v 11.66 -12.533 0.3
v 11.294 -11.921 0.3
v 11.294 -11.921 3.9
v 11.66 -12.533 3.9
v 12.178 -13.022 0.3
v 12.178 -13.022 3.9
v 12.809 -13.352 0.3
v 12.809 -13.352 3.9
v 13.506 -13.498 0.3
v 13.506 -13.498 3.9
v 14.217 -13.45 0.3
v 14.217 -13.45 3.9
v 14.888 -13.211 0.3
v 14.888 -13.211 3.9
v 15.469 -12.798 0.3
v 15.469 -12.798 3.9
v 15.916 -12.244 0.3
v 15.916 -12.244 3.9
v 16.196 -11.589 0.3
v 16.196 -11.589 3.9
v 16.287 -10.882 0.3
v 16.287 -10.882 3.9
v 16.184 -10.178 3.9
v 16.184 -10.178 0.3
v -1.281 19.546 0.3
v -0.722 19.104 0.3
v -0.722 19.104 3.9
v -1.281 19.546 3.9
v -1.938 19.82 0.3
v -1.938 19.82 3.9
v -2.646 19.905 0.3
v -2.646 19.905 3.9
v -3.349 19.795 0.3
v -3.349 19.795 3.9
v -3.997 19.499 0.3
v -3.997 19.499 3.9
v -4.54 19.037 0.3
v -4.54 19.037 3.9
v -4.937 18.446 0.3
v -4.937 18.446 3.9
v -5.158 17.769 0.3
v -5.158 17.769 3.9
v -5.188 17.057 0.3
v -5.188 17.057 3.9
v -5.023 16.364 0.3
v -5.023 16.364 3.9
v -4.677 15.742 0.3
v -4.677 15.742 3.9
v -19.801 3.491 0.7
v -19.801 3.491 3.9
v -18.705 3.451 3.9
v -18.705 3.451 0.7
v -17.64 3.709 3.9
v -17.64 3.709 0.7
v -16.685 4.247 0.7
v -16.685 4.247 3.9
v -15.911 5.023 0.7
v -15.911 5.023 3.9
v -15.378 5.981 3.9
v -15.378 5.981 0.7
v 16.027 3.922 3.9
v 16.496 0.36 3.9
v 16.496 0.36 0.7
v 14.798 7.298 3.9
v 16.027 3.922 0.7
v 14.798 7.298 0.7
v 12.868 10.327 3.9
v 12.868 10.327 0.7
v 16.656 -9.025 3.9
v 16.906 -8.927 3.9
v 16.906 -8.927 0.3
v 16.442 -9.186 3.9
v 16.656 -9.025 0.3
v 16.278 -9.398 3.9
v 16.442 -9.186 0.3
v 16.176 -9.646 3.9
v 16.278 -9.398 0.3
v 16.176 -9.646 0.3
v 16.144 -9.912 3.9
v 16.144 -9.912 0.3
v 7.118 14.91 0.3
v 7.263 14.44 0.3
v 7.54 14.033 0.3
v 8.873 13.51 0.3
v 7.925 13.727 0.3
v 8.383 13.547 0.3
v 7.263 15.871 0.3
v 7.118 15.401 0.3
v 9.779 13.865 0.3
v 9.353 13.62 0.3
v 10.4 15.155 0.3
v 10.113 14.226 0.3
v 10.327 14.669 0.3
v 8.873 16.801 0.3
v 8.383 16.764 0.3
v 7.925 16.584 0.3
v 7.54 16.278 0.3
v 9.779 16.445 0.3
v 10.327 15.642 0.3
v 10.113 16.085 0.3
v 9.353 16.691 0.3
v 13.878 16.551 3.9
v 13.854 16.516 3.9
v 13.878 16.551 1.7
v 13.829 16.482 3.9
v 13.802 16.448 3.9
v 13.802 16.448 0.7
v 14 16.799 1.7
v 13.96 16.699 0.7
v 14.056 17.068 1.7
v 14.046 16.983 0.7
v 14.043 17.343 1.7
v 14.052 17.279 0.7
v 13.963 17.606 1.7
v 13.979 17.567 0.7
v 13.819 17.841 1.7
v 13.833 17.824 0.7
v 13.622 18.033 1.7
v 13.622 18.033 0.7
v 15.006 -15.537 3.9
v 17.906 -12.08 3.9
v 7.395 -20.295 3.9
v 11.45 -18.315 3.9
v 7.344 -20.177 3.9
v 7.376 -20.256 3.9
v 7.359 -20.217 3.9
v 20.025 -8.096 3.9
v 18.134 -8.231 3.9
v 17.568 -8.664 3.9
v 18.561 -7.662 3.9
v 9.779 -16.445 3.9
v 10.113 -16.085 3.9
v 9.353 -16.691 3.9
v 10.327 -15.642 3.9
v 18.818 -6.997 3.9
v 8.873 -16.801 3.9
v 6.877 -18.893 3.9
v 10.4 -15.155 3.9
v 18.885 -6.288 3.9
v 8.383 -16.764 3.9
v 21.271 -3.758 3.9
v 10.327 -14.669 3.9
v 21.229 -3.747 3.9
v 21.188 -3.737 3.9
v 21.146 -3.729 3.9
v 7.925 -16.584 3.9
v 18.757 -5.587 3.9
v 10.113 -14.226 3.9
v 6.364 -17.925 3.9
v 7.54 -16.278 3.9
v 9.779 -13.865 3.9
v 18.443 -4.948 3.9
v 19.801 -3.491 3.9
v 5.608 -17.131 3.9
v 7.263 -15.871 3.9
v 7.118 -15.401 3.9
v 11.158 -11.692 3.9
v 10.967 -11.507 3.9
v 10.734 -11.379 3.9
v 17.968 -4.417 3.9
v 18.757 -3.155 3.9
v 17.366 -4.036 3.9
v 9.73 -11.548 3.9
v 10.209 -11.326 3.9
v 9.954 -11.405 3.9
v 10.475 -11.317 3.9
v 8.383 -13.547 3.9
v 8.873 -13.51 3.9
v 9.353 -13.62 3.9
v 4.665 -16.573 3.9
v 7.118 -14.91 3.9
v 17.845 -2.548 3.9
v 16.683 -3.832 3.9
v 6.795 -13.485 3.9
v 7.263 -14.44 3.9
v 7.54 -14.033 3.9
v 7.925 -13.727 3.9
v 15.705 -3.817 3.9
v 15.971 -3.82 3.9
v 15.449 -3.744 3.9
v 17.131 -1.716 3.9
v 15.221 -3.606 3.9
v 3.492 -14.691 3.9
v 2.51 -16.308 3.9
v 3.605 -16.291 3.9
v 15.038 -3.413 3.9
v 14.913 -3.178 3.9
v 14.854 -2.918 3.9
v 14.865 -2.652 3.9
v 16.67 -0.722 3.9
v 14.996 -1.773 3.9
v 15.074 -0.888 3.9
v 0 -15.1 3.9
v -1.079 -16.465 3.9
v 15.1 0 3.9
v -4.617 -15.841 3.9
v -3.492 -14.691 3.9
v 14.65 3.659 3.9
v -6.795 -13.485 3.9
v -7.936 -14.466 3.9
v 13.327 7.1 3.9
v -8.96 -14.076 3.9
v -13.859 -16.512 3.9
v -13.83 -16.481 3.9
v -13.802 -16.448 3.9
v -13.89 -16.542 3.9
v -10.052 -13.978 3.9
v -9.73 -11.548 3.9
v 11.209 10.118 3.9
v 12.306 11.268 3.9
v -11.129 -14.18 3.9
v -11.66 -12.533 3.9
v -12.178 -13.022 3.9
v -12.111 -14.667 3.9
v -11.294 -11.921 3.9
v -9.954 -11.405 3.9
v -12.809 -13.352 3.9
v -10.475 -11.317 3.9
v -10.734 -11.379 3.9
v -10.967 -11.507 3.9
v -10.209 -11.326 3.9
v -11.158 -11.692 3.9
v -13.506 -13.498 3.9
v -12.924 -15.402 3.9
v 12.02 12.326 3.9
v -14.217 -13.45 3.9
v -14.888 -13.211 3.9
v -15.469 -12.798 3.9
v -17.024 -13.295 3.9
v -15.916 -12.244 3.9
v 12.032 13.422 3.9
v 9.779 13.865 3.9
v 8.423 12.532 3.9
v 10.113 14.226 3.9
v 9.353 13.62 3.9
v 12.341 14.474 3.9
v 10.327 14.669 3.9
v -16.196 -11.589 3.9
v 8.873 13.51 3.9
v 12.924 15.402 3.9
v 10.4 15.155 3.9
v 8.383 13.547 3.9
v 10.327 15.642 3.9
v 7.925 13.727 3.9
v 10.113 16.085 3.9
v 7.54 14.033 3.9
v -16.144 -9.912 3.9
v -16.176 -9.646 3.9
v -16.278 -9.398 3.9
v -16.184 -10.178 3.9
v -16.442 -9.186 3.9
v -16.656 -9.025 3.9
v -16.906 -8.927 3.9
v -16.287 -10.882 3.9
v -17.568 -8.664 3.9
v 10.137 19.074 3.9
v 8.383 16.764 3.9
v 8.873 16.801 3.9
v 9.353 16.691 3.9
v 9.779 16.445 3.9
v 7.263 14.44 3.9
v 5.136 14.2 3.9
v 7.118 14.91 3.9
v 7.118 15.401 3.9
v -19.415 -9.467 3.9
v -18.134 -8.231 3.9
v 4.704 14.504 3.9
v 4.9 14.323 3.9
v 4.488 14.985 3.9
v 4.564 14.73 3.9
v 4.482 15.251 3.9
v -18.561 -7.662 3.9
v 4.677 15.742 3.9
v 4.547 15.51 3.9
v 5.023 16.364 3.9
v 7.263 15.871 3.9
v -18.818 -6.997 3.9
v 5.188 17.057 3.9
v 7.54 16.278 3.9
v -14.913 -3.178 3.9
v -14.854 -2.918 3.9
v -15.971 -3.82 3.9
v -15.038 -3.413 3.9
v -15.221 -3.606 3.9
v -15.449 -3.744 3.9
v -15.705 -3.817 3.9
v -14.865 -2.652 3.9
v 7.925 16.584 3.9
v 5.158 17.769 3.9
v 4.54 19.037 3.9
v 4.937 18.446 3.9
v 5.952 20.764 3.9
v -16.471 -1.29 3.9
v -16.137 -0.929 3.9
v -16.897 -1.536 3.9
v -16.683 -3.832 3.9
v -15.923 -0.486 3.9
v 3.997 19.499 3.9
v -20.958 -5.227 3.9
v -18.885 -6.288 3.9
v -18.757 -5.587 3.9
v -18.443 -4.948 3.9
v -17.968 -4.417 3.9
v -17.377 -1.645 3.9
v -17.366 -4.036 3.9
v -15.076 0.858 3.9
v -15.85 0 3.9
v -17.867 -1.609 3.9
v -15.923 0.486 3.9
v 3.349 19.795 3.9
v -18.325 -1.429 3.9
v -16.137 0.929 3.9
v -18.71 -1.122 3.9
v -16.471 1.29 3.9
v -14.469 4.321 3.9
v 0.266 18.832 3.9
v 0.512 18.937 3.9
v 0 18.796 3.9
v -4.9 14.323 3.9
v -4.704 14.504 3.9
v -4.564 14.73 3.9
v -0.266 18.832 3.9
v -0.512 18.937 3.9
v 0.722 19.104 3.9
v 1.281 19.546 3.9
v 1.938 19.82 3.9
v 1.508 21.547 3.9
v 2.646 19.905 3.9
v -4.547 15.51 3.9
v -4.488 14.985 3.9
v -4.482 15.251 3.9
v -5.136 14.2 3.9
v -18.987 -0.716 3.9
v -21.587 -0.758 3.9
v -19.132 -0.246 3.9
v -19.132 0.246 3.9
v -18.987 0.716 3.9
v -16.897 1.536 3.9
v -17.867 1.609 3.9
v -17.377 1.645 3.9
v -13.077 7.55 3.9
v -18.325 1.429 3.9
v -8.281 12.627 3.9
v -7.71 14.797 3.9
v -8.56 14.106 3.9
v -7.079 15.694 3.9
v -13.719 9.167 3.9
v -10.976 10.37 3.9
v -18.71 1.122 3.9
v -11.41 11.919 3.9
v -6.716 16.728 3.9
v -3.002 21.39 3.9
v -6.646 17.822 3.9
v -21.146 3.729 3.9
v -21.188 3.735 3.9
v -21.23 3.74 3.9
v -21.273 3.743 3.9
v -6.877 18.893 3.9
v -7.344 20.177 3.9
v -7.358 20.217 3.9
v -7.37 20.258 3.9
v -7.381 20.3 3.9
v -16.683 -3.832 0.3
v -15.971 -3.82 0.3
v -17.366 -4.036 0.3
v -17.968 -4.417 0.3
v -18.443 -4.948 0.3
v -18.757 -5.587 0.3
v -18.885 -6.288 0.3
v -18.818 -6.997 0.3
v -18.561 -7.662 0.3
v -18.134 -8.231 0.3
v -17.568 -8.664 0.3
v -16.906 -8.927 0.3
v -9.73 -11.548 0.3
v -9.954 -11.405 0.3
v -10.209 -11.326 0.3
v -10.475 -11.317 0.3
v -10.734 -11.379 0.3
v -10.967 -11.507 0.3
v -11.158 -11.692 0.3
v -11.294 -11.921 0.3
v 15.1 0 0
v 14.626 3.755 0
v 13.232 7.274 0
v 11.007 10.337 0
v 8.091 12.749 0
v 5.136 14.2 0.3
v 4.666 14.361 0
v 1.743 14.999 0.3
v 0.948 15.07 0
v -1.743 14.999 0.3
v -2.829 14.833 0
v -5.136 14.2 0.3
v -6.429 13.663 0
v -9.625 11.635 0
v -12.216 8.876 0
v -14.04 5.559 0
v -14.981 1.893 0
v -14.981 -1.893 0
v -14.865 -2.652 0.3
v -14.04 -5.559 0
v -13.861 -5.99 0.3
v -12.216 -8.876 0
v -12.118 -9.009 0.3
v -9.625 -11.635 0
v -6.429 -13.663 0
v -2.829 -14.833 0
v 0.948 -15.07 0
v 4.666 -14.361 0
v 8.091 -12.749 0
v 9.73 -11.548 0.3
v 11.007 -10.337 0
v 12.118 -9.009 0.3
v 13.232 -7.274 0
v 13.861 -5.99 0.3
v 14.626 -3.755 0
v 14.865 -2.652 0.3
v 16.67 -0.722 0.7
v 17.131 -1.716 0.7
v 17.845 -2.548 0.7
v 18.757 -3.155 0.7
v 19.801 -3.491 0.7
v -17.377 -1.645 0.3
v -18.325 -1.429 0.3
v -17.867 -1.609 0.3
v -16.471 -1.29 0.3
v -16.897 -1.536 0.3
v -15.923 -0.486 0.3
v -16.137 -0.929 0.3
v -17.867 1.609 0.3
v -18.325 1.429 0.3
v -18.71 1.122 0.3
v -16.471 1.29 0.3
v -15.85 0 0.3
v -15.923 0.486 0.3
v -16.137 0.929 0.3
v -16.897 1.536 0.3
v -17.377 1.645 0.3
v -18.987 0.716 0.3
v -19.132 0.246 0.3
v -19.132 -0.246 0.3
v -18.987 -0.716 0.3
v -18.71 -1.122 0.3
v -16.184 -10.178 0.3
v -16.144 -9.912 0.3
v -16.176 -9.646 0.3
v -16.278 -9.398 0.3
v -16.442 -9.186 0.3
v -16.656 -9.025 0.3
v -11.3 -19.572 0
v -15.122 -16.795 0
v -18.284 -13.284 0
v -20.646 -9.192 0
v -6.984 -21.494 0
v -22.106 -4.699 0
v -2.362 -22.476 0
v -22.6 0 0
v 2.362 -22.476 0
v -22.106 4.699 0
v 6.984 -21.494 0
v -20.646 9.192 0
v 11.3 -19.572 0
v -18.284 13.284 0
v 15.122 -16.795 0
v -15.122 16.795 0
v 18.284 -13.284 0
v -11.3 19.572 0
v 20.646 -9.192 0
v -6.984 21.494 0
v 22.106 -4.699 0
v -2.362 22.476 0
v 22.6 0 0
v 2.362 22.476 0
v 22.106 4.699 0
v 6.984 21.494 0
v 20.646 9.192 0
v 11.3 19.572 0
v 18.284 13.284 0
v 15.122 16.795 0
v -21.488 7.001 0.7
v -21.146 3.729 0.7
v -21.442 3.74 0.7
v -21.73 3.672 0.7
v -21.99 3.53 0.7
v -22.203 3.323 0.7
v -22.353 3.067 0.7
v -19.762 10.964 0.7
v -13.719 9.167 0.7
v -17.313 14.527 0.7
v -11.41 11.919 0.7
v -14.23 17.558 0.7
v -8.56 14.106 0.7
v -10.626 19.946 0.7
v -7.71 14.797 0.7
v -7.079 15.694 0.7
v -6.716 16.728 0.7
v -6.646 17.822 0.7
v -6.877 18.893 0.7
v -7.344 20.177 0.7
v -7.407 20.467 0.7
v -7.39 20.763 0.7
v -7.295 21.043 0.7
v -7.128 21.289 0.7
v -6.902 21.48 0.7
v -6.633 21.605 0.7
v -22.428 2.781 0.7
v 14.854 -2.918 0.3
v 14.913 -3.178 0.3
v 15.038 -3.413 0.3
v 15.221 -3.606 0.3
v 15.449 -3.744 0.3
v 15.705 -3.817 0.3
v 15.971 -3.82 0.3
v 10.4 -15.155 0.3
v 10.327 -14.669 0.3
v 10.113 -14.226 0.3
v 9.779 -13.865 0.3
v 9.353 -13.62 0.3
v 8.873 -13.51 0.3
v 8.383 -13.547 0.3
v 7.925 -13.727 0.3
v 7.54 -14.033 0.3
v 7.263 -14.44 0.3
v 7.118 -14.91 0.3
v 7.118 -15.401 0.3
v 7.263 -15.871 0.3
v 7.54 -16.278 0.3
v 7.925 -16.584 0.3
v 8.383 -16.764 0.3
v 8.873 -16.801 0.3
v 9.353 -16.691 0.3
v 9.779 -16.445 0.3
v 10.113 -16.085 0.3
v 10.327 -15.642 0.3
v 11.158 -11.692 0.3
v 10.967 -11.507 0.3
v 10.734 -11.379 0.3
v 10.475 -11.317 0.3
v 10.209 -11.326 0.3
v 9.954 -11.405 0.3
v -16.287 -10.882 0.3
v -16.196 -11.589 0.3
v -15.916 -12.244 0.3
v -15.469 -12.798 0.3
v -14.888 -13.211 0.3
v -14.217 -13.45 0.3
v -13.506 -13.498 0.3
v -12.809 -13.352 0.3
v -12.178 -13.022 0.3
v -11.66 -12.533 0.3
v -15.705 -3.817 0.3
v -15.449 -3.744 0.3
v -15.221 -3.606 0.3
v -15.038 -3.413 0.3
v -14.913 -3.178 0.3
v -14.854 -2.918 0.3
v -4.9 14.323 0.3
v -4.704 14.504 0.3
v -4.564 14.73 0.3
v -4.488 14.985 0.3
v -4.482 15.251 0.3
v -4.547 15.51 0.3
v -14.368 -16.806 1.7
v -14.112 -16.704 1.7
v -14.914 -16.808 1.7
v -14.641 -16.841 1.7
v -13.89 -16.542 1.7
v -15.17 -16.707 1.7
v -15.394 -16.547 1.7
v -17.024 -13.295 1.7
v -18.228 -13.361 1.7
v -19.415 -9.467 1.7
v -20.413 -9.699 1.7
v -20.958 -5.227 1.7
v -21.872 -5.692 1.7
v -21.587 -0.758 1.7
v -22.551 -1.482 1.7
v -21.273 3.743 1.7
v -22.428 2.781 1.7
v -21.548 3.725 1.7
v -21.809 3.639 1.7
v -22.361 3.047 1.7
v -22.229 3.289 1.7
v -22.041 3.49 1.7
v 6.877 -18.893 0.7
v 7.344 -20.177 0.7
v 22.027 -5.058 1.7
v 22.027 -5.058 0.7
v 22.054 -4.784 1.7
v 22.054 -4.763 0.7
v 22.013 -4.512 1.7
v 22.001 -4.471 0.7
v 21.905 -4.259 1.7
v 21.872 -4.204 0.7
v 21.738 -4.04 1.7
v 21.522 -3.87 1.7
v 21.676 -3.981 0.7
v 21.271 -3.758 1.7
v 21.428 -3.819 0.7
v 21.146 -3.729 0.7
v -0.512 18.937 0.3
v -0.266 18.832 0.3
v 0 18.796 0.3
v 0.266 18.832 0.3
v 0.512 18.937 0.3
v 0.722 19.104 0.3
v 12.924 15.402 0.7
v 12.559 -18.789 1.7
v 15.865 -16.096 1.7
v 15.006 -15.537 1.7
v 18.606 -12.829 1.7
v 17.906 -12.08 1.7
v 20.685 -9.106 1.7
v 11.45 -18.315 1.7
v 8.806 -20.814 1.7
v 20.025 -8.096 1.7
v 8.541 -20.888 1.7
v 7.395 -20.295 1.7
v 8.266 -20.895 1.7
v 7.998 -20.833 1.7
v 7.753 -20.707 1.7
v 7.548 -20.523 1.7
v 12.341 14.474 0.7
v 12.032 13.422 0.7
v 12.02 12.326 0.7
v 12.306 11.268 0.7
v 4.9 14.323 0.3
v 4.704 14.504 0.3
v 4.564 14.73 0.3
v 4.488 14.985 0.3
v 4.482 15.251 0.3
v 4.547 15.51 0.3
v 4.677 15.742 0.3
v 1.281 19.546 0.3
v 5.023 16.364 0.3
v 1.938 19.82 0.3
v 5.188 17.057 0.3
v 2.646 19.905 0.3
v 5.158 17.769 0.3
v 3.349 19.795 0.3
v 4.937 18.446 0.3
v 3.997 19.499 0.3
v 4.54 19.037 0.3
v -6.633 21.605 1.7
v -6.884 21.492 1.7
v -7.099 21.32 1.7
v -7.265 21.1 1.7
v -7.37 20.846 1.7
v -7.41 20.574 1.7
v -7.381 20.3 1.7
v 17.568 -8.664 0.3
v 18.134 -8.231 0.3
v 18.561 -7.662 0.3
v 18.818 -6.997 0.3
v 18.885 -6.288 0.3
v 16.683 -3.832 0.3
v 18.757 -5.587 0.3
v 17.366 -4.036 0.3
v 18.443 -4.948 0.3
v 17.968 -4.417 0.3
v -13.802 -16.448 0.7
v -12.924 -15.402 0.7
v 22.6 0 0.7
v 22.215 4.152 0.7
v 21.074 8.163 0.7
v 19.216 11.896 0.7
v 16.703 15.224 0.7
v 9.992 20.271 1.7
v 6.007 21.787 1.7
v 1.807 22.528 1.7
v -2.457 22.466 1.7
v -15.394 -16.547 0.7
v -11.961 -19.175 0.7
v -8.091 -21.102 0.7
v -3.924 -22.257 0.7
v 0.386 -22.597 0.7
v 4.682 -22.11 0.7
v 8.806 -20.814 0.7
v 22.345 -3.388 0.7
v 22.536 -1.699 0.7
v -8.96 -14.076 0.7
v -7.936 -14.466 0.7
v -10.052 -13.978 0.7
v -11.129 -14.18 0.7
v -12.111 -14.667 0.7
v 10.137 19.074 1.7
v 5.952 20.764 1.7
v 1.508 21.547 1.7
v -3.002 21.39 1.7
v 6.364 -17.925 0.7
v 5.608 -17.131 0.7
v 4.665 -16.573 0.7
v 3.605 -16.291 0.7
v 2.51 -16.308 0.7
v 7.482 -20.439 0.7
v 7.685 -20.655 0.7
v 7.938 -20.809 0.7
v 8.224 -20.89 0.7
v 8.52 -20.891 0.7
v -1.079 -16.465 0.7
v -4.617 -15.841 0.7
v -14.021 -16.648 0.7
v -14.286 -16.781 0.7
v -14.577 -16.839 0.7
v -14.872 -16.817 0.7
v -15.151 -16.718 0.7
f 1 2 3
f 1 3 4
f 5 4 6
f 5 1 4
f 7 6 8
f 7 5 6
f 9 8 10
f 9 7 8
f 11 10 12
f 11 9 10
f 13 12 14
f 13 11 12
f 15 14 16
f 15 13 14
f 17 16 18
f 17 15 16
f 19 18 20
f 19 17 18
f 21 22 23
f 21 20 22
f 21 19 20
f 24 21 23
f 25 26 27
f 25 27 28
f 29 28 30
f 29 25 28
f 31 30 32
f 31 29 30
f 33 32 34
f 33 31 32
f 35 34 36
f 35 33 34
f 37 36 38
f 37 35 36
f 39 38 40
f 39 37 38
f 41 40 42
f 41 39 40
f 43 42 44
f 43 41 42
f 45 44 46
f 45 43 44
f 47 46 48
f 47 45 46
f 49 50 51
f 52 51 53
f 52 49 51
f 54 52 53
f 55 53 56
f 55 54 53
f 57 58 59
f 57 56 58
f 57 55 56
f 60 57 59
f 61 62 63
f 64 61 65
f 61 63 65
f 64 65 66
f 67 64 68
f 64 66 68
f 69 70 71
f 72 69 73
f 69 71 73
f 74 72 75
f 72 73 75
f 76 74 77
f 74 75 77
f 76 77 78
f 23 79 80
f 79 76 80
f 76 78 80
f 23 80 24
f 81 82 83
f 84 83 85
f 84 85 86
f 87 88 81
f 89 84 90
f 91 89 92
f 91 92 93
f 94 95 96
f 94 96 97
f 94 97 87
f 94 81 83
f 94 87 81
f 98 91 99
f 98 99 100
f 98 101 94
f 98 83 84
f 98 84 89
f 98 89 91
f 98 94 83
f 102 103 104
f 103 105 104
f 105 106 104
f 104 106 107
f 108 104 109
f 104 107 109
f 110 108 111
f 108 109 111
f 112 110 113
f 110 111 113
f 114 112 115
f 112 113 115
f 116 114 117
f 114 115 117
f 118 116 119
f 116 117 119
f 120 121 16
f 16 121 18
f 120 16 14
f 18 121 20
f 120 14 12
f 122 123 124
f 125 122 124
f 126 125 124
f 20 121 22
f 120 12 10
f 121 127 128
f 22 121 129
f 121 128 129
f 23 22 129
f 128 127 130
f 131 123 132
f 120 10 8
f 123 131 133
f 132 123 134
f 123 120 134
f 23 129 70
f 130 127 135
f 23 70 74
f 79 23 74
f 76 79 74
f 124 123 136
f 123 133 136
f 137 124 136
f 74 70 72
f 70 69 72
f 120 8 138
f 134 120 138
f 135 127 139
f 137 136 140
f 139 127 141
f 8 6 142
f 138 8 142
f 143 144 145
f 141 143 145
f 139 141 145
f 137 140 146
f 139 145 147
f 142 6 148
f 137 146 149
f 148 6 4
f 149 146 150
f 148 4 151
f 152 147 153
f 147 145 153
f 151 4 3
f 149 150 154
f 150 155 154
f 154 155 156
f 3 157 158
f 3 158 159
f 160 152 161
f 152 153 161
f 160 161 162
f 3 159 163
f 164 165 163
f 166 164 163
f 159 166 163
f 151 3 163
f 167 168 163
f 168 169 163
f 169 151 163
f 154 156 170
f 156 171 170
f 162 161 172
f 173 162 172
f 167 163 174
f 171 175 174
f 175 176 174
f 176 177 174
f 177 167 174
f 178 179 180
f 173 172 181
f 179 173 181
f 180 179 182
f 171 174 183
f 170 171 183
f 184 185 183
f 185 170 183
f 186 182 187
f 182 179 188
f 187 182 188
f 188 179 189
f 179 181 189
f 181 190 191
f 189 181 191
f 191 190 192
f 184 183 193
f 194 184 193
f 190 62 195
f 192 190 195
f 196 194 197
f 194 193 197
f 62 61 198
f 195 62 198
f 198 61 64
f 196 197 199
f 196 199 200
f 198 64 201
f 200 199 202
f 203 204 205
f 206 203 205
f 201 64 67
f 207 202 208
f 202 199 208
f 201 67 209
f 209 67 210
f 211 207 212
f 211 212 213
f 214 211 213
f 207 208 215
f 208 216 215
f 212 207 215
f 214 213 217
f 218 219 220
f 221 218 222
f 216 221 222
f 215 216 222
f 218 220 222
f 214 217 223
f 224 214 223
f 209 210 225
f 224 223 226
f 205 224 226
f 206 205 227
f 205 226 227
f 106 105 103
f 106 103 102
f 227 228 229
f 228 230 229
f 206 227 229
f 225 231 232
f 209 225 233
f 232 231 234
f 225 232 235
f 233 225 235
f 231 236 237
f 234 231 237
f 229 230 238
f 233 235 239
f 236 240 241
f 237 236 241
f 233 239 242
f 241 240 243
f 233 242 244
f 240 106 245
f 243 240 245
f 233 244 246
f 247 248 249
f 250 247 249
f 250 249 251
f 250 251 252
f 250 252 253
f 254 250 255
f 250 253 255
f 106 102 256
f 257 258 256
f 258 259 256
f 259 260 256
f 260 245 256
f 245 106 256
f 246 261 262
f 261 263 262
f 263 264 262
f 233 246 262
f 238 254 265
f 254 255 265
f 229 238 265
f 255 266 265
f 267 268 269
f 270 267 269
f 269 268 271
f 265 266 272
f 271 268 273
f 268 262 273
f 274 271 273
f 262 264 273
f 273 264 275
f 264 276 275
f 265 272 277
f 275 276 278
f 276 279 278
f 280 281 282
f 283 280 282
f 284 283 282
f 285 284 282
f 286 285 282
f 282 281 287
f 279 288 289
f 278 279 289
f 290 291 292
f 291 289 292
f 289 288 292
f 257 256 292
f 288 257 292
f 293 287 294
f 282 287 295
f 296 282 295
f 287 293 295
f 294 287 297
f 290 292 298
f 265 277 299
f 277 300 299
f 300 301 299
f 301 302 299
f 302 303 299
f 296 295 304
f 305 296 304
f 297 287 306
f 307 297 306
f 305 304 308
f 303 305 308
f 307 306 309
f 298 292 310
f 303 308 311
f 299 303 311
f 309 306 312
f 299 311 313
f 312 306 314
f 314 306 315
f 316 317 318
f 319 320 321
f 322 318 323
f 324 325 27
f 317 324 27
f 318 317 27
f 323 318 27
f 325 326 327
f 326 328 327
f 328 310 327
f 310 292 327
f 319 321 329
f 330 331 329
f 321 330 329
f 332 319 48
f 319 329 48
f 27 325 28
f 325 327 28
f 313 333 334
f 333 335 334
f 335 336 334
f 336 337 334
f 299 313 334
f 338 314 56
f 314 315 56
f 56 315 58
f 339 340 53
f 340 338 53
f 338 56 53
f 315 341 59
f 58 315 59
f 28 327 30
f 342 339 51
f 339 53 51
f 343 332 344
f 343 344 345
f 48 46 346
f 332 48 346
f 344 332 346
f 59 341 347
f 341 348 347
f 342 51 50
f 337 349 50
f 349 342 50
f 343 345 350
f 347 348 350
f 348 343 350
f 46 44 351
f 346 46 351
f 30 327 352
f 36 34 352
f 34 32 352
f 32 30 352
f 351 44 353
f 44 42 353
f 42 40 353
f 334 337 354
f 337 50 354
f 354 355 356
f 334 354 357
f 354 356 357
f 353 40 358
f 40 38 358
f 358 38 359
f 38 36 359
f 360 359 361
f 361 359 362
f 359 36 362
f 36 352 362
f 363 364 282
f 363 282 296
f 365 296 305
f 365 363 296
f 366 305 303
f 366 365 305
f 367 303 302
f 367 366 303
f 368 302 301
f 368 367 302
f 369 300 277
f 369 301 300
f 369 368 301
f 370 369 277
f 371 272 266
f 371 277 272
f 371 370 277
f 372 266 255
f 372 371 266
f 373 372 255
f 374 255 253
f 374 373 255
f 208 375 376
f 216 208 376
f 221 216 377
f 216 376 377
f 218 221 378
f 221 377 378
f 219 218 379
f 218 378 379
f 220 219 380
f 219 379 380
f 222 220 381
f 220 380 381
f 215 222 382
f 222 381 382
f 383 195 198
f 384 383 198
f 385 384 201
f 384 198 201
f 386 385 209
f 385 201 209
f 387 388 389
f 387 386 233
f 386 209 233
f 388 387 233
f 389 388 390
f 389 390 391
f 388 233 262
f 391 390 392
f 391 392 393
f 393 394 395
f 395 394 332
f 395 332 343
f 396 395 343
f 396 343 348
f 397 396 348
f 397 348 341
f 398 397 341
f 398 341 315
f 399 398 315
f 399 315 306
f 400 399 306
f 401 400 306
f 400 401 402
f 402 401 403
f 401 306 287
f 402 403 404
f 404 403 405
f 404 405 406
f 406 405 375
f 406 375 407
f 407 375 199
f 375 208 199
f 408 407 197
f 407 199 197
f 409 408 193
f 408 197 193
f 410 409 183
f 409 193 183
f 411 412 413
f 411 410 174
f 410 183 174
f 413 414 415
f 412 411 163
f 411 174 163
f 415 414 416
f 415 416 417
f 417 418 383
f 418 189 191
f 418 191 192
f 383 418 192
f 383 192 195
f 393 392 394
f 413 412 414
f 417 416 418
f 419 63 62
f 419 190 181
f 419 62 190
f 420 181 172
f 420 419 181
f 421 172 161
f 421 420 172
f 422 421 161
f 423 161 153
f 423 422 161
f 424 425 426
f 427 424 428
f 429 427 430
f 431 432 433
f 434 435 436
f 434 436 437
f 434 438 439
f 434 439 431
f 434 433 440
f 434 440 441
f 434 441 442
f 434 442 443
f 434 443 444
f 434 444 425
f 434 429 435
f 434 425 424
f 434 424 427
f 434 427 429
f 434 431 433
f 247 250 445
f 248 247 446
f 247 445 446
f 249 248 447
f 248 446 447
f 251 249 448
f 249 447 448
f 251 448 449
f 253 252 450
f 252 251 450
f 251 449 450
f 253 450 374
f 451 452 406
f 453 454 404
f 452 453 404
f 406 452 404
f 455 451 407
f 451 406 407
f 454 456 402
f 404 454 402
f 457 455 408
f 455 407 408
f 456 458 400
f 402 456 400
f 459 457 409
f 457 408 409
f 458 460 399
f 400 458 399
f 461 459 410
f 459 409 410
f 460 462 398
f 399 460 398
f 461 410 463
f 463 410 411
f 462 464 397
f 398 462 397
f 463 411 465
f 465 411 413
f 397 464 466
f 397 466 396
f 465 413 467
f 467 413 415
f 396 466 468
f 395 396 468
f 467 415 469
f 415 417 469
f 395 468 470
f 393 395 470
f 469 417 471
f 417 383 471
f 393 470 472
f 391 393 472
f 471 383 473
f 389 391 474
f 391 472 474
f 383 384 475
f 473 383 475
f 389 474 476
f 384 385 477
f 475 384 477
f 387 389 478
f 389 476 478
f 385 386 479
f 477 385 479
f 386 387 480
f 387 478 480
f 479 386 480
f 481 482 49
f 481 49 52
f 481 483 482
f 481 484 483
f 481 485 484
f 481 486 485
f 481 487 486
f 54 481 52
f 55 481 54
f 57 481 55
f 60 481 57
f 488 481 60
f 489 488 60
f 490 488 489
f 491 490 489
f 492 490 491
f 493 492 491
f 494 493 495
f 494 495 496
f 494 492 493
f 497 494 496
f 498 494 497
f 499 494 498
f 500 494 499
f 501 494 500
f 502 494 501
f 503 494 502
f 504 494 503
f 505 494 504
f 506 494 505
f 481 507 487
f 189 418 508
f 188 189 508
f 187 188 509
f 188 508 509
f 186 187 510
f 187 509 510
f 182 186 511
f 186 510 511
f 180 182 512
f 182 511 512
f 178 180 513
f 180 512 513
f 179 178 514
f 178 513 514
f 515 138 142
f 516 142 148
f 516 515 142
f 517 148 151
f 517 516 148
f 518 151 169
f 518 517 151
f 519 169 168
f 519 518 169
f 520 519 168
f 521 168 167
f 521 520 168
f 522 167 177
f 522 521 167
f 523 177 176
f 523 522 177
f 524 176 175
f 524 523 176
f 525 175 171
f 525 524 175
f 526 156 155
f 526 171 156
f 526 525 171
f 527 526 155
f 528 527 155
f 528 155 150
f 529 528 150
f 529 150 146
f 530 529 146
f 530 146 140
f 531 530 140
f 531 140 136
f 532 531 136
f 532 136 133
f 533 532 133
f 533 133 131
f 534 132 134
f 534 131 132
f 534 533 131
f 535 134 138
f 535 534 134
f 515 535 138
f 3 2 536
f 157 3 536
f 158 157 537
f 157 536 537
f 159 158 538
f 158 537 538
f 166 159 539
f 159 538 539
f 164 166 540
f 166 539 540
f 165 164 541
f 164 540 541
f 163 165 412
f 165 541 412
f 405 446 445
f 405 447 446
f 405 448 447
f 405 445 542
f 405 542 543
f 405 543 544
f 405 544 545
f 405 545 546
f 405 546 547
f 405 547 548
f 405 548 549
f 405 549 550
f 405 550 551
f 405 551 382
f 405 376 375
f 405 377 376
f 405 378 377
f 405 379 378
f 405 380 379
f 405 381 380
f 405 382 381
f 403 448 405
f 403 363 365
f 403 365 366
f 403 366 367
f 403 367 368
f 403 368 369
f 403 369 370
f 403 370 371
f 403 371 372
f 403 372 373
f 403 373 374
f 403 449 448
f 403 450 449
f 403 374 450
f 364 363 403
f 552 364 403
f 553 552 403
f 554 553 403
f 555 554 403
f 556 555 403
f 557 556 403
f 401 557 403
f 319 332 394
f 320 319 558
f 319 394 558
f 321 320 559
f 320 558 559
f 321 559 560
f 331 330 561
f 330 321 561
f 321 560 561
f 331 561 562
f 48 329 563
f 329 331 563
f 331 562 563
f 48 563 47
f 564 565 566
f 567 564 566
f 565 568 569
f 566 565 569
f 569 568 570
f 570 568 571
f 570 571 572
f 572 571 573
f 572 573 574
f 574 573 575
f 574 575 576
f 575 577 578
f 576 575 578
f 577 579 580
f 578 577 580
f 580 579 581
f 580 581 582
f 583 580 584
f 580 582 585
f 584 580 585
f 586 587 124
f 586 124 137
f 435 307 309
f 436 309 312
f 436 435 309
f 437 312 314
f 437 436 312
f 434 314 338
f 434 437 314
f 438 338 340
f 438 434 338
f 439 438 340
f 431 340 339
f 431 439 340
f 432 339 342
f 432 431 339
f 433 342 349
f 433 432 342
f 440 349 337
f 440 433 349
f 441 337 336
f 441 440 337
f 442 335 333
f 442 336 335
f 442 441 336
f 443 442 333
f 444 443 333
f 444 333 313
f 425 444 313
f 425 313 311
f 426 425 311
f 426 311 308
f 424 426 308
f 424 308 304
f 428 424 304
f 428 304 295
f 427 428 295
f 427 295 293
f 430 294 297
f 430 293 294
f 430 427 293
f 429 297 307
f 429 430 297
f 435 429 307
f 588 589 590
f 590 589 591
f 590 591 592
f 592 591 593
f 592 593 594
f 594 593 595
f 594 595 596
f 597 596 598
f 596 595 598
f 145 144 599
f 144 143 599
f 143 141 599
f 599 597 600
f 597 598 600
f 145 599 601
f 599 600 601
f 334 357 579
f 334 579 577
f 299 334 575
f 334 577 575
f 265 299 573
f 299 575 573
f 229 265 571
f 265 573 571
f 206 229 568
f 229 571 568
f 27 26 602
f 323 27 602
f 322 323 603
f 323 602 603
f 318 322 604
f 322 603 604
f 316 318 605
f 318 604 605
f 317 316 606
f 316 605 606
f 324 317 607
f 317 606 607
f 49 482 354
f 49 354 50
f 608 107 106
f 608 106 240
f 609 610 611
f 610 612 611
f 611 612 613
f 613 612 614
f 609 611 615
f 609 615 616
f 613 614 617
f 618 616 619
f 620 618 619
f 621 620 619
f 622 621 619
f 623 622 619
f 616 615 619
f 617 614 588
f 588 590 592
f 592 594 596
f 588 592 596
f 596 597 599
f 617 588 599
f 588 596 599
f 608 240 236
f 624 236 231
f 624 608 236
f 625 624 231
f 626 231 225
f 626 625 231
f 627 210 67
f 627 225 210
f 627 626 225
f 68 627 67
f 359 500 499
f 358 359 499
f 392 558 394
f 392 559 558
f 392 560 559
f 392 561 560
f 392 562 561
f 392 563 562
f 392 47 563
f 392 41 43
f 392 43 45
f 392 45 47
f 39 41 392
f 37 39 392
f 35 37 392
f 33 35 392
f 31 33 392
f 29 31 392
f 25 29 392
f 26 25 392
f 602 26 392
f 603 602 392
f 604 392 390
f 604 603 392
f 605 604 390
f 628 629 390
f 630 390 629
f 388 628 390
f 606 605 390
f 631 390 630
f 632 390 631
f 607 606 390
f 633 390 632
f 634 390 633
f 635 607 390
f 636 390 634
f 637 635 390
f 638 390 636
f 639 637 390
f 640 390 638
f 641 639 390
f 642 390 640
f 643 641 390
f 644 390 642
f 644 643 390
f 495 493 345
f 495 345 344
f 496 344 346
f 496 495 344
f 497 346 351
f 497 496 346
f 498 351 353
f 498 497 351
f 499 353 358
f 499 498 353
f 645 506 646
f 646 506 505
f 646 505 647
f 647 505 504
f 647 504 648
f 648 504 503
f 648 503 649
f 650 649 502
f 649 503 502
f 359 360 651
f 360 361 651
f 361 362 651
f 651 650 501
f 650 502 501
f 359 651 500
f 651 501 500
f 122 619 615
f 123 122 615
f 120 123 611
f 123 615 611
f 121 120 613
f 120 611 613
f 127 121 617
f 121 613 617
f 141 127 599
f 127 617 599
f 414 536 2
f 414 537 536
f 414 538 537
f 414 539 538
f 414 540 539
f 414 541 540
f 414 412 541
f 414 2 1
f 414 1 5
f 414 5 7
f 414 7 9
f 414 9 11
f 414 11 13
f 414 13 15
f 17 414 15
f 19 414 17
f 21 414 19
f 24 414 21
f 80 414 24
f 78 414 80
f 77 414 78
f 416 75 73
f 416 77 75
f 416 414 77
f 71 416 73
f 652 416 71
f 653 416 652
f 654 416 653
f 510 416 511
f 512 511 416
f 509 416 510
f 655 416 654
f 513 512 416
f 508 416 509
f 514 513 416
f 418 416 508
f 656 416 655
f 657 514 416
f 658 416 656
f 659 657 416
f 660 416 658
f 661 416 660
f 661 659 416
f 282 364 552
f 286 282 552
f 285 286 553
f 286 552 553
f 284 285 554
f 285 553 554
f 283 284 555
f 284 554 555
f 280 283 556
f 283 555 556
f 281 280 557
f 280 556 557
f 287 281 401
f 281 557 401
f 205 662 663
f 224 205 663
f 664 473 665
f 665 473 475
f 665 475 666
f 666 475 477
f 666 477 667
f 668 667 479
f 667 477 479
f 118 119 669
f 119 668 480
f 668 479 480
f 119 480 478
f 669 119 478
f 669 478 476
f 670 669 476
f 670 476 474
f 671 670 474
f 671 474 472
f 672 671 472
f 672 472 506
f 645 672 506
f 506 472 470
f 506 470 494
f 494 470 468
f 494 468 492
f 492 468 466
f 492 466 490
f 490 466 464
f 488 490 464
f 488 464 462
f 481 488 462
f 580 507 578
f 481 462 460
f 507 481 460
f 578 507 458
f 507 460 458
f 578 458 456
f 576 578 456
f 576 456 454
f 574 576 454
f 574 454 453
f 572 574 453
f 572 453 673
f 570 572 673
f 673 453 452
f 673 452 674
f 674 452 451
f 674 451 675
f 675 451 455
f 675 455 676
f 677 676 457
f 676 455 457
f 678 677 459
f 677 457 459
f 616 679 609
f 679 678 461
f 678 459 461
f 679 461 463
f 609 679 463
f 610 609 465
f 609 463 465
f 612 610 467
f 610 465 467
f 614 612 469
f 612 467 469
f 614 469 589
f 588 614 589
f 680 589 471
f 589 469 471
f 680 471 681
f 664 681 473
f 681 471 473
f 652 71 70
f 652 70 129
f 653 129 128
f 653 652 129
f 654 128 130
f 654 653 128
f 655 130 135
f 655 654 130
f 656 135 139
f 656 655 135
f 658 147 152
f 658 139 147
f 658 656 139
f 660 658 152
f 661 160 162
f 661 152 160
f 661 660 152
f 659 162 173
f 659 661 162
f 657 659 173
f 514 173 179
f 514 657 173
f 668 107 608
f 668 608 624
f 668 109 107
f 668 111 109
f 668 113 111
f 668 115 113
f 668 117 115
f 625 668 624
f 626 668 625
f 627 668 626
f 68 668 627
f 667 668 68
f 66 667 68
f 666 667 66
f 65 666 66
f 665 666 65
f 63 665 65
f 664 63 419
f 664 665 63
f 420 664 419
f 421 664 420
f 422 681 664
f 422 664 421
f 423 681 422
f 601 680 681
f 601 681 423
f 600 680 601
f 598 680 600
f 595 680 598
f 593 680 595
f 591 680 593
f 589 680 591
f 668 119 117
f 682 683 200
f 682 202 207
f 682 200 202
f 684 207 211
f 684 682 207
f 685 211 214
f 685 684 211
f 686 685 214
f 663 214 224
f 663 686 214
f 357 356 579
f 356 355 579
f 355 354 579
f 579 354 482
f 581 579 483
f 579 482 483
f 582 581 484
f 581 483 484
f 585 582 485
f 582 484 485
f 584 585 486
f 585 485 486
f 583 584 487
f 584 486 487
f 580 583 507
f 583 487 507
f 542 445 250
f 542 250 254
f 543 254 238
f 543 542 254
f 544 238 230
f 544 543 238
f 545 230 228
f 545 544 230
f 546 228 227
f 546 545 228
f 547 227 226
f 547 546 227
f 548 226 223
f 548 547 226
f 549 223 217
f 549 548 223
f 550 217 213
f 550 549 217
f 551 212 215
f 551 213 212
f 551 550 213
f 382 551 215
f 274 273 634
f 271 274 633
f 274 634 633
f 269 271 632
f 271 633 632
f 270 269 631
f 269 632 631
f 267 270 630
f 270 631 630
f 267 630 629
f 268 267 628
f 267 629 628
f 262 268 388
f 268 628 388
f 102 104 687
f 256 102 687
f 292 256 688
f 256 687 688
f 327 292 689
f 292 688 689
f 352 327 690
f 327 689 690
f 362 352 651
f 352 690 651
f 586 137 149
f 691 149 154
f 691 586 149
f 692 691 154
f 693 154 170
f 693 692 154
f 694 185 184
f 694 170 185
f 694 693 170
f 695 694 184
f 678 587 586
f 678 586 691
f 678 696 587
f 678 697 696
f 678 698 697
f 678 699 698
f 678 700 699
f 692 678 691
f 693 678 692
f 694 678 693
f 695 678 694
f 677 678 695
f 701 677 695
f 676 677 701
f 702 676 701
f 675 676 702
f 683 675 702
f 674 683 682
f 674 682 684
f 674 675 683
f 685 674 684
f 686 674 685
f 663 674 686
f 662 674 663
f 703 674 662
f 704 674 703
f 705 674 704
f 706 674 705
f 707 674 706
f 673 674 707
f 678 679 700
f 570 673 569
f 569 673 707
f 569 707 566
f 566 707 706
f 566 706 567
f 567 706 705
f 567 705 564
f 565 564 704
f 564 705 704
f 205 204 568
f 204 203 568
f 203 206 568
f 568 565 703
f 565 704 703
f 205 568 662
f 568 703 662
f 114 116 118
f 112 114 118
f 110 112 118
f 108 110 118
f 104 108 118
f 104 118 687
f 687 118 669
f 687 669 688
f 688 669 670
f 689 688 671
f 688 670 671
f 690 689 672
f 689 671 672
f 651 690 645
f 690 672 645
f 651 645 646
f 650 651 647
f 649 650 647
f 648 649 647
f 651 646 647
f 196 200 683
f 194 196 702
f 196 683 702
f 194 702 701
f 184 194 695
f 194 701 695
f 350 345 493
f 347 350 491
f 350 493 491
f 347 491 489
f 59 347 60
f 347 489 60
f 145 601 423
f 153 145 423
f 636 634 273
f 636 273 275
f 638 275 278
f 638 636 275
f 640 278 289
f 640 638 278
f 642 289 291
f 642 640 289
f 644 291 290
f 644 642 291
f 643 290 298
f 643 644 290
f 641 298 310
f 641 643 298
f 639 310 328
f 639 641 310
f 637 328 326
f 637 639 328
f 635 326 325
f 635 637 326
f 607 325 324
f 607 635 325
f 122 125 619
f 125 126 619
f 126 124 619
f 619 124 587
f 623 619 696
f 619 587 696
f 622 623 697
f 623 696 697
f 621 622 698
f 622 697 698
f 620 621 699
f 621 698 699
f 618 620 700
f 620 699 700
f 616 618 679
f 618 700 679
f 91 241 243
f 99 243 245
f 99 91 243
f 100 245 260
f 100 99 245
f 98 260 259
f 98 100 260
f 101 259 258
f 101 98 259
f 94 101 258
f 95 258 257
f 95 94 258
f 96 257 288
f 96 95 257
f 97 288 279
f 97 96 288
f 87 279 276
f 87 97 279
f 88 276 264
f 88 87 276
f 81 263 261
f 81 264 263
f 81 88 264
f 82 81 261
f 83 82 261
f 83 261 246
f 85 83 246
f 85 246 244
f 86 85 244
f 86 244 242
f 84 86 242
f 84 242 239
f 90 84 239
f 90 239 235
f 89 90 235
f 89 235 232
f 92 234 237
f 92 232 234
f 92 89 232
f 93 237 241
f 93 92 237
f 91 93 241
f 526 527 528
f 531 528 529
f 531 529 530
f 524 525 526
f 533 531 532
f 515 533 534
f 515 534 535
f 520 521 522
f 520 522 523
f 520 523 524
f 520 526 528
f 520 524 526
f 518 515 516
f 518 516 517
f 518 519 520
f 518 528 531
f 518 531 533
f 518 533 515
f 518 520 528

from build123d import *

# Parameters (mm, degrees)
POCKET_DEPTH       = 5.2
POCKET001_DEPTH    = 131.2836295795
POLARPATTERN_COUNT = 3
SKETCH003_R        = 1.65
POCKET002_DEPTH    = 3.601


with BuildPart() as part:
    # Sketch → Revolution (revolve)
    with BuildSketch(Plane.XZ):
        Polygon((15.1, 0), (15.1, 3.9), (21.6, 3.9), (21.6, 1.7), (22.6, 1.7), (22.6, 0), align=None)
    revolve(axis=Axis((0, 0, 0), (0, 0, 1)))

    # Sketch001 → Pocket (cut)
    with BuildSketch(Plane.XY.offset(0.3)):
        with BuildLine():
            ThreePointArc((-15.9712383567, -3.8204989231), (-18.8447644437, -5.9331508585), (-16.9057454793, -8.9265863145))
            ThreePointArc((-16.1835232571, -10.1775118978), (-16.2776050381, -9.3978796505), (-16.9057454793, -8.9265863145))
            ThreePointArc((-16.1835232571, -10.1775118978), (-14.5606415898, -13.3534693073), (-11.2942683009, -11.9212486852))
            ThreePointArc((-9.7295516419, -11.5475462696), (-10.6061902717, -11.3396396422), (-11.2942683009, -11.9212486852))
            ThreePointArc((-9.7295516419, -11.5475462696), (0, -15.1), (9.7295516419, -11.5475462696))
            ThreePointArc((11.2942683009, -11.9212486852), (10.6061902717, -11.3396396422), (9.7295516419, -11.5475462696))
            ThreePointArc((11.2942683009, -11.9212486852), (14.5606415898, -13.3534693073), (16.1835232571, -10.1775118978))
            ThreePointArc((16.9057454793, -8.9265863145), (16.2776050381, -9.3978796505), (16.1835232571, -10.1775118978))
            ThreePointArc((16.9057454793, -8.9265863145), (18.8447644437, -5.9331508585), (15.9712383567, -3.8204989231))
            ThreePointArc((14.8652442418, -2.6522657545), (15.1235111358, -3.5154103916), (15.9712383567, -3.8204989231))
            ThreePointArc((14.8652442418, -2.6522657545), (13.0769835971, 7.55), (5.1356925999, 14.1998120241))
            ThreePointArc((4.6769700558, 15.7417476083), (4.517320864, 14.8550500338), (5.1356925999, 14.1998120241))
            ThreePointArc((4.6769700558, 15.7417476083), (4.2841228539, 19.2866201659), (0.7222222222, 19.1040982123))
            ThreePointArc((-0.7222222222, 19.1040982123), (0, 18.7957593011), (0.7222222222, 19.1040982123))
            ThreePointArc((-0.7222222222, 19.1040982123), (-4.2841228539, 19.2866201659), (-4.6769700558, 15.7417476083))
            ThreePointArc((-5.1356925999, 14.1998120241), (-4.517320864, 14.8550500338), (-4.6769700558, 15.7417476083))
            ThreePointArc((-5.1356925999, 14.1998120241), (-13.0769835972, 7.55), (-14.8652442418, -2.6522657545))
            ThreePointArc((-15.9712383567, -3.8204989231), (-15.1235111358, -3.5154103916), (-14.8652442418, -2.6522657545))
        make_face()
    extrude(amount=POCKET_DEPTH, mode=Mode.SUBTRACT)

    # Sketch002 → Pocket001 (cut, through all)
    with BuildSketch(Plane.XY.offset(0.7)):
        with BuildLine():
            Line((-21.1456411257, 3.728513813), (-19.8005265105, 3.4913338142))
            ThreePointArc((-19.8005265105, 3.4913338142), (-17.143892895, 3.9448230849), (-15.3779467169, 5.9806985187))
            ThreePointArc((-8.5602136605, 14.1057698155), (-12.6397419459, 10.6059852697), (-15.3779467169, 5.9806985187))
            ThreePointArc((-8.5602136605, 14.1057698155), (-6.8619255723, 16.1984130552), (-6.876646489, 18.8934309501))
            Line((-7.3438021199, 20.1769304973), (-6.876646489, 18.8934309501))
            ThreePointArc((-6.6329850074, 21.6047103635), (-7.2948567632, 21.0433924702), (-7.3438021199, 20.1769304973))
            ThreePointArc((-6.6329850074, 21.6047103635), (-17.3126154887, 14.5269867812), (-22.428296266, 2.7805622822))
            ThreePointArc((-21.1456411257, 3.728513813), (-21.9904400194, 3.5298512156), (-22.428296266, 2.7805622822))
        make_face()
    pocket001 = extrude(amount=POCKET001_DEPTH, mode=Mode.SUBTRACT)

    # PolarPattern: Pocket001 ×3 about axis
    polarpattern_axis = Axis((0, 0, 0.7), (0, 0, 1))
    for i in range(1, POLARPATTERN_COUNT):
        add(pocket001.rotate(polarpattern_axis, i * 360 / POLARPATTERN_COUNT), mode=Mode.SUBTRACT)

    # Sketch003 → Pocket002 (cut, through all)
    with BuildSketch(Plane.XY.offset(0.3)):
        with Locations((8.75, 15.1554445662)):
            Circle(SKETCH003_R)
        with Locations((-17.5, 0)):
            Circle(SKETCH003_R)
        with Locations((8.75, -15.1554445662)):
            Circle(SKETCH003_R)
    extrude(amount=POCKET002_DEPTH, mode=Mode.SUBTRACT)


solid = part.part
